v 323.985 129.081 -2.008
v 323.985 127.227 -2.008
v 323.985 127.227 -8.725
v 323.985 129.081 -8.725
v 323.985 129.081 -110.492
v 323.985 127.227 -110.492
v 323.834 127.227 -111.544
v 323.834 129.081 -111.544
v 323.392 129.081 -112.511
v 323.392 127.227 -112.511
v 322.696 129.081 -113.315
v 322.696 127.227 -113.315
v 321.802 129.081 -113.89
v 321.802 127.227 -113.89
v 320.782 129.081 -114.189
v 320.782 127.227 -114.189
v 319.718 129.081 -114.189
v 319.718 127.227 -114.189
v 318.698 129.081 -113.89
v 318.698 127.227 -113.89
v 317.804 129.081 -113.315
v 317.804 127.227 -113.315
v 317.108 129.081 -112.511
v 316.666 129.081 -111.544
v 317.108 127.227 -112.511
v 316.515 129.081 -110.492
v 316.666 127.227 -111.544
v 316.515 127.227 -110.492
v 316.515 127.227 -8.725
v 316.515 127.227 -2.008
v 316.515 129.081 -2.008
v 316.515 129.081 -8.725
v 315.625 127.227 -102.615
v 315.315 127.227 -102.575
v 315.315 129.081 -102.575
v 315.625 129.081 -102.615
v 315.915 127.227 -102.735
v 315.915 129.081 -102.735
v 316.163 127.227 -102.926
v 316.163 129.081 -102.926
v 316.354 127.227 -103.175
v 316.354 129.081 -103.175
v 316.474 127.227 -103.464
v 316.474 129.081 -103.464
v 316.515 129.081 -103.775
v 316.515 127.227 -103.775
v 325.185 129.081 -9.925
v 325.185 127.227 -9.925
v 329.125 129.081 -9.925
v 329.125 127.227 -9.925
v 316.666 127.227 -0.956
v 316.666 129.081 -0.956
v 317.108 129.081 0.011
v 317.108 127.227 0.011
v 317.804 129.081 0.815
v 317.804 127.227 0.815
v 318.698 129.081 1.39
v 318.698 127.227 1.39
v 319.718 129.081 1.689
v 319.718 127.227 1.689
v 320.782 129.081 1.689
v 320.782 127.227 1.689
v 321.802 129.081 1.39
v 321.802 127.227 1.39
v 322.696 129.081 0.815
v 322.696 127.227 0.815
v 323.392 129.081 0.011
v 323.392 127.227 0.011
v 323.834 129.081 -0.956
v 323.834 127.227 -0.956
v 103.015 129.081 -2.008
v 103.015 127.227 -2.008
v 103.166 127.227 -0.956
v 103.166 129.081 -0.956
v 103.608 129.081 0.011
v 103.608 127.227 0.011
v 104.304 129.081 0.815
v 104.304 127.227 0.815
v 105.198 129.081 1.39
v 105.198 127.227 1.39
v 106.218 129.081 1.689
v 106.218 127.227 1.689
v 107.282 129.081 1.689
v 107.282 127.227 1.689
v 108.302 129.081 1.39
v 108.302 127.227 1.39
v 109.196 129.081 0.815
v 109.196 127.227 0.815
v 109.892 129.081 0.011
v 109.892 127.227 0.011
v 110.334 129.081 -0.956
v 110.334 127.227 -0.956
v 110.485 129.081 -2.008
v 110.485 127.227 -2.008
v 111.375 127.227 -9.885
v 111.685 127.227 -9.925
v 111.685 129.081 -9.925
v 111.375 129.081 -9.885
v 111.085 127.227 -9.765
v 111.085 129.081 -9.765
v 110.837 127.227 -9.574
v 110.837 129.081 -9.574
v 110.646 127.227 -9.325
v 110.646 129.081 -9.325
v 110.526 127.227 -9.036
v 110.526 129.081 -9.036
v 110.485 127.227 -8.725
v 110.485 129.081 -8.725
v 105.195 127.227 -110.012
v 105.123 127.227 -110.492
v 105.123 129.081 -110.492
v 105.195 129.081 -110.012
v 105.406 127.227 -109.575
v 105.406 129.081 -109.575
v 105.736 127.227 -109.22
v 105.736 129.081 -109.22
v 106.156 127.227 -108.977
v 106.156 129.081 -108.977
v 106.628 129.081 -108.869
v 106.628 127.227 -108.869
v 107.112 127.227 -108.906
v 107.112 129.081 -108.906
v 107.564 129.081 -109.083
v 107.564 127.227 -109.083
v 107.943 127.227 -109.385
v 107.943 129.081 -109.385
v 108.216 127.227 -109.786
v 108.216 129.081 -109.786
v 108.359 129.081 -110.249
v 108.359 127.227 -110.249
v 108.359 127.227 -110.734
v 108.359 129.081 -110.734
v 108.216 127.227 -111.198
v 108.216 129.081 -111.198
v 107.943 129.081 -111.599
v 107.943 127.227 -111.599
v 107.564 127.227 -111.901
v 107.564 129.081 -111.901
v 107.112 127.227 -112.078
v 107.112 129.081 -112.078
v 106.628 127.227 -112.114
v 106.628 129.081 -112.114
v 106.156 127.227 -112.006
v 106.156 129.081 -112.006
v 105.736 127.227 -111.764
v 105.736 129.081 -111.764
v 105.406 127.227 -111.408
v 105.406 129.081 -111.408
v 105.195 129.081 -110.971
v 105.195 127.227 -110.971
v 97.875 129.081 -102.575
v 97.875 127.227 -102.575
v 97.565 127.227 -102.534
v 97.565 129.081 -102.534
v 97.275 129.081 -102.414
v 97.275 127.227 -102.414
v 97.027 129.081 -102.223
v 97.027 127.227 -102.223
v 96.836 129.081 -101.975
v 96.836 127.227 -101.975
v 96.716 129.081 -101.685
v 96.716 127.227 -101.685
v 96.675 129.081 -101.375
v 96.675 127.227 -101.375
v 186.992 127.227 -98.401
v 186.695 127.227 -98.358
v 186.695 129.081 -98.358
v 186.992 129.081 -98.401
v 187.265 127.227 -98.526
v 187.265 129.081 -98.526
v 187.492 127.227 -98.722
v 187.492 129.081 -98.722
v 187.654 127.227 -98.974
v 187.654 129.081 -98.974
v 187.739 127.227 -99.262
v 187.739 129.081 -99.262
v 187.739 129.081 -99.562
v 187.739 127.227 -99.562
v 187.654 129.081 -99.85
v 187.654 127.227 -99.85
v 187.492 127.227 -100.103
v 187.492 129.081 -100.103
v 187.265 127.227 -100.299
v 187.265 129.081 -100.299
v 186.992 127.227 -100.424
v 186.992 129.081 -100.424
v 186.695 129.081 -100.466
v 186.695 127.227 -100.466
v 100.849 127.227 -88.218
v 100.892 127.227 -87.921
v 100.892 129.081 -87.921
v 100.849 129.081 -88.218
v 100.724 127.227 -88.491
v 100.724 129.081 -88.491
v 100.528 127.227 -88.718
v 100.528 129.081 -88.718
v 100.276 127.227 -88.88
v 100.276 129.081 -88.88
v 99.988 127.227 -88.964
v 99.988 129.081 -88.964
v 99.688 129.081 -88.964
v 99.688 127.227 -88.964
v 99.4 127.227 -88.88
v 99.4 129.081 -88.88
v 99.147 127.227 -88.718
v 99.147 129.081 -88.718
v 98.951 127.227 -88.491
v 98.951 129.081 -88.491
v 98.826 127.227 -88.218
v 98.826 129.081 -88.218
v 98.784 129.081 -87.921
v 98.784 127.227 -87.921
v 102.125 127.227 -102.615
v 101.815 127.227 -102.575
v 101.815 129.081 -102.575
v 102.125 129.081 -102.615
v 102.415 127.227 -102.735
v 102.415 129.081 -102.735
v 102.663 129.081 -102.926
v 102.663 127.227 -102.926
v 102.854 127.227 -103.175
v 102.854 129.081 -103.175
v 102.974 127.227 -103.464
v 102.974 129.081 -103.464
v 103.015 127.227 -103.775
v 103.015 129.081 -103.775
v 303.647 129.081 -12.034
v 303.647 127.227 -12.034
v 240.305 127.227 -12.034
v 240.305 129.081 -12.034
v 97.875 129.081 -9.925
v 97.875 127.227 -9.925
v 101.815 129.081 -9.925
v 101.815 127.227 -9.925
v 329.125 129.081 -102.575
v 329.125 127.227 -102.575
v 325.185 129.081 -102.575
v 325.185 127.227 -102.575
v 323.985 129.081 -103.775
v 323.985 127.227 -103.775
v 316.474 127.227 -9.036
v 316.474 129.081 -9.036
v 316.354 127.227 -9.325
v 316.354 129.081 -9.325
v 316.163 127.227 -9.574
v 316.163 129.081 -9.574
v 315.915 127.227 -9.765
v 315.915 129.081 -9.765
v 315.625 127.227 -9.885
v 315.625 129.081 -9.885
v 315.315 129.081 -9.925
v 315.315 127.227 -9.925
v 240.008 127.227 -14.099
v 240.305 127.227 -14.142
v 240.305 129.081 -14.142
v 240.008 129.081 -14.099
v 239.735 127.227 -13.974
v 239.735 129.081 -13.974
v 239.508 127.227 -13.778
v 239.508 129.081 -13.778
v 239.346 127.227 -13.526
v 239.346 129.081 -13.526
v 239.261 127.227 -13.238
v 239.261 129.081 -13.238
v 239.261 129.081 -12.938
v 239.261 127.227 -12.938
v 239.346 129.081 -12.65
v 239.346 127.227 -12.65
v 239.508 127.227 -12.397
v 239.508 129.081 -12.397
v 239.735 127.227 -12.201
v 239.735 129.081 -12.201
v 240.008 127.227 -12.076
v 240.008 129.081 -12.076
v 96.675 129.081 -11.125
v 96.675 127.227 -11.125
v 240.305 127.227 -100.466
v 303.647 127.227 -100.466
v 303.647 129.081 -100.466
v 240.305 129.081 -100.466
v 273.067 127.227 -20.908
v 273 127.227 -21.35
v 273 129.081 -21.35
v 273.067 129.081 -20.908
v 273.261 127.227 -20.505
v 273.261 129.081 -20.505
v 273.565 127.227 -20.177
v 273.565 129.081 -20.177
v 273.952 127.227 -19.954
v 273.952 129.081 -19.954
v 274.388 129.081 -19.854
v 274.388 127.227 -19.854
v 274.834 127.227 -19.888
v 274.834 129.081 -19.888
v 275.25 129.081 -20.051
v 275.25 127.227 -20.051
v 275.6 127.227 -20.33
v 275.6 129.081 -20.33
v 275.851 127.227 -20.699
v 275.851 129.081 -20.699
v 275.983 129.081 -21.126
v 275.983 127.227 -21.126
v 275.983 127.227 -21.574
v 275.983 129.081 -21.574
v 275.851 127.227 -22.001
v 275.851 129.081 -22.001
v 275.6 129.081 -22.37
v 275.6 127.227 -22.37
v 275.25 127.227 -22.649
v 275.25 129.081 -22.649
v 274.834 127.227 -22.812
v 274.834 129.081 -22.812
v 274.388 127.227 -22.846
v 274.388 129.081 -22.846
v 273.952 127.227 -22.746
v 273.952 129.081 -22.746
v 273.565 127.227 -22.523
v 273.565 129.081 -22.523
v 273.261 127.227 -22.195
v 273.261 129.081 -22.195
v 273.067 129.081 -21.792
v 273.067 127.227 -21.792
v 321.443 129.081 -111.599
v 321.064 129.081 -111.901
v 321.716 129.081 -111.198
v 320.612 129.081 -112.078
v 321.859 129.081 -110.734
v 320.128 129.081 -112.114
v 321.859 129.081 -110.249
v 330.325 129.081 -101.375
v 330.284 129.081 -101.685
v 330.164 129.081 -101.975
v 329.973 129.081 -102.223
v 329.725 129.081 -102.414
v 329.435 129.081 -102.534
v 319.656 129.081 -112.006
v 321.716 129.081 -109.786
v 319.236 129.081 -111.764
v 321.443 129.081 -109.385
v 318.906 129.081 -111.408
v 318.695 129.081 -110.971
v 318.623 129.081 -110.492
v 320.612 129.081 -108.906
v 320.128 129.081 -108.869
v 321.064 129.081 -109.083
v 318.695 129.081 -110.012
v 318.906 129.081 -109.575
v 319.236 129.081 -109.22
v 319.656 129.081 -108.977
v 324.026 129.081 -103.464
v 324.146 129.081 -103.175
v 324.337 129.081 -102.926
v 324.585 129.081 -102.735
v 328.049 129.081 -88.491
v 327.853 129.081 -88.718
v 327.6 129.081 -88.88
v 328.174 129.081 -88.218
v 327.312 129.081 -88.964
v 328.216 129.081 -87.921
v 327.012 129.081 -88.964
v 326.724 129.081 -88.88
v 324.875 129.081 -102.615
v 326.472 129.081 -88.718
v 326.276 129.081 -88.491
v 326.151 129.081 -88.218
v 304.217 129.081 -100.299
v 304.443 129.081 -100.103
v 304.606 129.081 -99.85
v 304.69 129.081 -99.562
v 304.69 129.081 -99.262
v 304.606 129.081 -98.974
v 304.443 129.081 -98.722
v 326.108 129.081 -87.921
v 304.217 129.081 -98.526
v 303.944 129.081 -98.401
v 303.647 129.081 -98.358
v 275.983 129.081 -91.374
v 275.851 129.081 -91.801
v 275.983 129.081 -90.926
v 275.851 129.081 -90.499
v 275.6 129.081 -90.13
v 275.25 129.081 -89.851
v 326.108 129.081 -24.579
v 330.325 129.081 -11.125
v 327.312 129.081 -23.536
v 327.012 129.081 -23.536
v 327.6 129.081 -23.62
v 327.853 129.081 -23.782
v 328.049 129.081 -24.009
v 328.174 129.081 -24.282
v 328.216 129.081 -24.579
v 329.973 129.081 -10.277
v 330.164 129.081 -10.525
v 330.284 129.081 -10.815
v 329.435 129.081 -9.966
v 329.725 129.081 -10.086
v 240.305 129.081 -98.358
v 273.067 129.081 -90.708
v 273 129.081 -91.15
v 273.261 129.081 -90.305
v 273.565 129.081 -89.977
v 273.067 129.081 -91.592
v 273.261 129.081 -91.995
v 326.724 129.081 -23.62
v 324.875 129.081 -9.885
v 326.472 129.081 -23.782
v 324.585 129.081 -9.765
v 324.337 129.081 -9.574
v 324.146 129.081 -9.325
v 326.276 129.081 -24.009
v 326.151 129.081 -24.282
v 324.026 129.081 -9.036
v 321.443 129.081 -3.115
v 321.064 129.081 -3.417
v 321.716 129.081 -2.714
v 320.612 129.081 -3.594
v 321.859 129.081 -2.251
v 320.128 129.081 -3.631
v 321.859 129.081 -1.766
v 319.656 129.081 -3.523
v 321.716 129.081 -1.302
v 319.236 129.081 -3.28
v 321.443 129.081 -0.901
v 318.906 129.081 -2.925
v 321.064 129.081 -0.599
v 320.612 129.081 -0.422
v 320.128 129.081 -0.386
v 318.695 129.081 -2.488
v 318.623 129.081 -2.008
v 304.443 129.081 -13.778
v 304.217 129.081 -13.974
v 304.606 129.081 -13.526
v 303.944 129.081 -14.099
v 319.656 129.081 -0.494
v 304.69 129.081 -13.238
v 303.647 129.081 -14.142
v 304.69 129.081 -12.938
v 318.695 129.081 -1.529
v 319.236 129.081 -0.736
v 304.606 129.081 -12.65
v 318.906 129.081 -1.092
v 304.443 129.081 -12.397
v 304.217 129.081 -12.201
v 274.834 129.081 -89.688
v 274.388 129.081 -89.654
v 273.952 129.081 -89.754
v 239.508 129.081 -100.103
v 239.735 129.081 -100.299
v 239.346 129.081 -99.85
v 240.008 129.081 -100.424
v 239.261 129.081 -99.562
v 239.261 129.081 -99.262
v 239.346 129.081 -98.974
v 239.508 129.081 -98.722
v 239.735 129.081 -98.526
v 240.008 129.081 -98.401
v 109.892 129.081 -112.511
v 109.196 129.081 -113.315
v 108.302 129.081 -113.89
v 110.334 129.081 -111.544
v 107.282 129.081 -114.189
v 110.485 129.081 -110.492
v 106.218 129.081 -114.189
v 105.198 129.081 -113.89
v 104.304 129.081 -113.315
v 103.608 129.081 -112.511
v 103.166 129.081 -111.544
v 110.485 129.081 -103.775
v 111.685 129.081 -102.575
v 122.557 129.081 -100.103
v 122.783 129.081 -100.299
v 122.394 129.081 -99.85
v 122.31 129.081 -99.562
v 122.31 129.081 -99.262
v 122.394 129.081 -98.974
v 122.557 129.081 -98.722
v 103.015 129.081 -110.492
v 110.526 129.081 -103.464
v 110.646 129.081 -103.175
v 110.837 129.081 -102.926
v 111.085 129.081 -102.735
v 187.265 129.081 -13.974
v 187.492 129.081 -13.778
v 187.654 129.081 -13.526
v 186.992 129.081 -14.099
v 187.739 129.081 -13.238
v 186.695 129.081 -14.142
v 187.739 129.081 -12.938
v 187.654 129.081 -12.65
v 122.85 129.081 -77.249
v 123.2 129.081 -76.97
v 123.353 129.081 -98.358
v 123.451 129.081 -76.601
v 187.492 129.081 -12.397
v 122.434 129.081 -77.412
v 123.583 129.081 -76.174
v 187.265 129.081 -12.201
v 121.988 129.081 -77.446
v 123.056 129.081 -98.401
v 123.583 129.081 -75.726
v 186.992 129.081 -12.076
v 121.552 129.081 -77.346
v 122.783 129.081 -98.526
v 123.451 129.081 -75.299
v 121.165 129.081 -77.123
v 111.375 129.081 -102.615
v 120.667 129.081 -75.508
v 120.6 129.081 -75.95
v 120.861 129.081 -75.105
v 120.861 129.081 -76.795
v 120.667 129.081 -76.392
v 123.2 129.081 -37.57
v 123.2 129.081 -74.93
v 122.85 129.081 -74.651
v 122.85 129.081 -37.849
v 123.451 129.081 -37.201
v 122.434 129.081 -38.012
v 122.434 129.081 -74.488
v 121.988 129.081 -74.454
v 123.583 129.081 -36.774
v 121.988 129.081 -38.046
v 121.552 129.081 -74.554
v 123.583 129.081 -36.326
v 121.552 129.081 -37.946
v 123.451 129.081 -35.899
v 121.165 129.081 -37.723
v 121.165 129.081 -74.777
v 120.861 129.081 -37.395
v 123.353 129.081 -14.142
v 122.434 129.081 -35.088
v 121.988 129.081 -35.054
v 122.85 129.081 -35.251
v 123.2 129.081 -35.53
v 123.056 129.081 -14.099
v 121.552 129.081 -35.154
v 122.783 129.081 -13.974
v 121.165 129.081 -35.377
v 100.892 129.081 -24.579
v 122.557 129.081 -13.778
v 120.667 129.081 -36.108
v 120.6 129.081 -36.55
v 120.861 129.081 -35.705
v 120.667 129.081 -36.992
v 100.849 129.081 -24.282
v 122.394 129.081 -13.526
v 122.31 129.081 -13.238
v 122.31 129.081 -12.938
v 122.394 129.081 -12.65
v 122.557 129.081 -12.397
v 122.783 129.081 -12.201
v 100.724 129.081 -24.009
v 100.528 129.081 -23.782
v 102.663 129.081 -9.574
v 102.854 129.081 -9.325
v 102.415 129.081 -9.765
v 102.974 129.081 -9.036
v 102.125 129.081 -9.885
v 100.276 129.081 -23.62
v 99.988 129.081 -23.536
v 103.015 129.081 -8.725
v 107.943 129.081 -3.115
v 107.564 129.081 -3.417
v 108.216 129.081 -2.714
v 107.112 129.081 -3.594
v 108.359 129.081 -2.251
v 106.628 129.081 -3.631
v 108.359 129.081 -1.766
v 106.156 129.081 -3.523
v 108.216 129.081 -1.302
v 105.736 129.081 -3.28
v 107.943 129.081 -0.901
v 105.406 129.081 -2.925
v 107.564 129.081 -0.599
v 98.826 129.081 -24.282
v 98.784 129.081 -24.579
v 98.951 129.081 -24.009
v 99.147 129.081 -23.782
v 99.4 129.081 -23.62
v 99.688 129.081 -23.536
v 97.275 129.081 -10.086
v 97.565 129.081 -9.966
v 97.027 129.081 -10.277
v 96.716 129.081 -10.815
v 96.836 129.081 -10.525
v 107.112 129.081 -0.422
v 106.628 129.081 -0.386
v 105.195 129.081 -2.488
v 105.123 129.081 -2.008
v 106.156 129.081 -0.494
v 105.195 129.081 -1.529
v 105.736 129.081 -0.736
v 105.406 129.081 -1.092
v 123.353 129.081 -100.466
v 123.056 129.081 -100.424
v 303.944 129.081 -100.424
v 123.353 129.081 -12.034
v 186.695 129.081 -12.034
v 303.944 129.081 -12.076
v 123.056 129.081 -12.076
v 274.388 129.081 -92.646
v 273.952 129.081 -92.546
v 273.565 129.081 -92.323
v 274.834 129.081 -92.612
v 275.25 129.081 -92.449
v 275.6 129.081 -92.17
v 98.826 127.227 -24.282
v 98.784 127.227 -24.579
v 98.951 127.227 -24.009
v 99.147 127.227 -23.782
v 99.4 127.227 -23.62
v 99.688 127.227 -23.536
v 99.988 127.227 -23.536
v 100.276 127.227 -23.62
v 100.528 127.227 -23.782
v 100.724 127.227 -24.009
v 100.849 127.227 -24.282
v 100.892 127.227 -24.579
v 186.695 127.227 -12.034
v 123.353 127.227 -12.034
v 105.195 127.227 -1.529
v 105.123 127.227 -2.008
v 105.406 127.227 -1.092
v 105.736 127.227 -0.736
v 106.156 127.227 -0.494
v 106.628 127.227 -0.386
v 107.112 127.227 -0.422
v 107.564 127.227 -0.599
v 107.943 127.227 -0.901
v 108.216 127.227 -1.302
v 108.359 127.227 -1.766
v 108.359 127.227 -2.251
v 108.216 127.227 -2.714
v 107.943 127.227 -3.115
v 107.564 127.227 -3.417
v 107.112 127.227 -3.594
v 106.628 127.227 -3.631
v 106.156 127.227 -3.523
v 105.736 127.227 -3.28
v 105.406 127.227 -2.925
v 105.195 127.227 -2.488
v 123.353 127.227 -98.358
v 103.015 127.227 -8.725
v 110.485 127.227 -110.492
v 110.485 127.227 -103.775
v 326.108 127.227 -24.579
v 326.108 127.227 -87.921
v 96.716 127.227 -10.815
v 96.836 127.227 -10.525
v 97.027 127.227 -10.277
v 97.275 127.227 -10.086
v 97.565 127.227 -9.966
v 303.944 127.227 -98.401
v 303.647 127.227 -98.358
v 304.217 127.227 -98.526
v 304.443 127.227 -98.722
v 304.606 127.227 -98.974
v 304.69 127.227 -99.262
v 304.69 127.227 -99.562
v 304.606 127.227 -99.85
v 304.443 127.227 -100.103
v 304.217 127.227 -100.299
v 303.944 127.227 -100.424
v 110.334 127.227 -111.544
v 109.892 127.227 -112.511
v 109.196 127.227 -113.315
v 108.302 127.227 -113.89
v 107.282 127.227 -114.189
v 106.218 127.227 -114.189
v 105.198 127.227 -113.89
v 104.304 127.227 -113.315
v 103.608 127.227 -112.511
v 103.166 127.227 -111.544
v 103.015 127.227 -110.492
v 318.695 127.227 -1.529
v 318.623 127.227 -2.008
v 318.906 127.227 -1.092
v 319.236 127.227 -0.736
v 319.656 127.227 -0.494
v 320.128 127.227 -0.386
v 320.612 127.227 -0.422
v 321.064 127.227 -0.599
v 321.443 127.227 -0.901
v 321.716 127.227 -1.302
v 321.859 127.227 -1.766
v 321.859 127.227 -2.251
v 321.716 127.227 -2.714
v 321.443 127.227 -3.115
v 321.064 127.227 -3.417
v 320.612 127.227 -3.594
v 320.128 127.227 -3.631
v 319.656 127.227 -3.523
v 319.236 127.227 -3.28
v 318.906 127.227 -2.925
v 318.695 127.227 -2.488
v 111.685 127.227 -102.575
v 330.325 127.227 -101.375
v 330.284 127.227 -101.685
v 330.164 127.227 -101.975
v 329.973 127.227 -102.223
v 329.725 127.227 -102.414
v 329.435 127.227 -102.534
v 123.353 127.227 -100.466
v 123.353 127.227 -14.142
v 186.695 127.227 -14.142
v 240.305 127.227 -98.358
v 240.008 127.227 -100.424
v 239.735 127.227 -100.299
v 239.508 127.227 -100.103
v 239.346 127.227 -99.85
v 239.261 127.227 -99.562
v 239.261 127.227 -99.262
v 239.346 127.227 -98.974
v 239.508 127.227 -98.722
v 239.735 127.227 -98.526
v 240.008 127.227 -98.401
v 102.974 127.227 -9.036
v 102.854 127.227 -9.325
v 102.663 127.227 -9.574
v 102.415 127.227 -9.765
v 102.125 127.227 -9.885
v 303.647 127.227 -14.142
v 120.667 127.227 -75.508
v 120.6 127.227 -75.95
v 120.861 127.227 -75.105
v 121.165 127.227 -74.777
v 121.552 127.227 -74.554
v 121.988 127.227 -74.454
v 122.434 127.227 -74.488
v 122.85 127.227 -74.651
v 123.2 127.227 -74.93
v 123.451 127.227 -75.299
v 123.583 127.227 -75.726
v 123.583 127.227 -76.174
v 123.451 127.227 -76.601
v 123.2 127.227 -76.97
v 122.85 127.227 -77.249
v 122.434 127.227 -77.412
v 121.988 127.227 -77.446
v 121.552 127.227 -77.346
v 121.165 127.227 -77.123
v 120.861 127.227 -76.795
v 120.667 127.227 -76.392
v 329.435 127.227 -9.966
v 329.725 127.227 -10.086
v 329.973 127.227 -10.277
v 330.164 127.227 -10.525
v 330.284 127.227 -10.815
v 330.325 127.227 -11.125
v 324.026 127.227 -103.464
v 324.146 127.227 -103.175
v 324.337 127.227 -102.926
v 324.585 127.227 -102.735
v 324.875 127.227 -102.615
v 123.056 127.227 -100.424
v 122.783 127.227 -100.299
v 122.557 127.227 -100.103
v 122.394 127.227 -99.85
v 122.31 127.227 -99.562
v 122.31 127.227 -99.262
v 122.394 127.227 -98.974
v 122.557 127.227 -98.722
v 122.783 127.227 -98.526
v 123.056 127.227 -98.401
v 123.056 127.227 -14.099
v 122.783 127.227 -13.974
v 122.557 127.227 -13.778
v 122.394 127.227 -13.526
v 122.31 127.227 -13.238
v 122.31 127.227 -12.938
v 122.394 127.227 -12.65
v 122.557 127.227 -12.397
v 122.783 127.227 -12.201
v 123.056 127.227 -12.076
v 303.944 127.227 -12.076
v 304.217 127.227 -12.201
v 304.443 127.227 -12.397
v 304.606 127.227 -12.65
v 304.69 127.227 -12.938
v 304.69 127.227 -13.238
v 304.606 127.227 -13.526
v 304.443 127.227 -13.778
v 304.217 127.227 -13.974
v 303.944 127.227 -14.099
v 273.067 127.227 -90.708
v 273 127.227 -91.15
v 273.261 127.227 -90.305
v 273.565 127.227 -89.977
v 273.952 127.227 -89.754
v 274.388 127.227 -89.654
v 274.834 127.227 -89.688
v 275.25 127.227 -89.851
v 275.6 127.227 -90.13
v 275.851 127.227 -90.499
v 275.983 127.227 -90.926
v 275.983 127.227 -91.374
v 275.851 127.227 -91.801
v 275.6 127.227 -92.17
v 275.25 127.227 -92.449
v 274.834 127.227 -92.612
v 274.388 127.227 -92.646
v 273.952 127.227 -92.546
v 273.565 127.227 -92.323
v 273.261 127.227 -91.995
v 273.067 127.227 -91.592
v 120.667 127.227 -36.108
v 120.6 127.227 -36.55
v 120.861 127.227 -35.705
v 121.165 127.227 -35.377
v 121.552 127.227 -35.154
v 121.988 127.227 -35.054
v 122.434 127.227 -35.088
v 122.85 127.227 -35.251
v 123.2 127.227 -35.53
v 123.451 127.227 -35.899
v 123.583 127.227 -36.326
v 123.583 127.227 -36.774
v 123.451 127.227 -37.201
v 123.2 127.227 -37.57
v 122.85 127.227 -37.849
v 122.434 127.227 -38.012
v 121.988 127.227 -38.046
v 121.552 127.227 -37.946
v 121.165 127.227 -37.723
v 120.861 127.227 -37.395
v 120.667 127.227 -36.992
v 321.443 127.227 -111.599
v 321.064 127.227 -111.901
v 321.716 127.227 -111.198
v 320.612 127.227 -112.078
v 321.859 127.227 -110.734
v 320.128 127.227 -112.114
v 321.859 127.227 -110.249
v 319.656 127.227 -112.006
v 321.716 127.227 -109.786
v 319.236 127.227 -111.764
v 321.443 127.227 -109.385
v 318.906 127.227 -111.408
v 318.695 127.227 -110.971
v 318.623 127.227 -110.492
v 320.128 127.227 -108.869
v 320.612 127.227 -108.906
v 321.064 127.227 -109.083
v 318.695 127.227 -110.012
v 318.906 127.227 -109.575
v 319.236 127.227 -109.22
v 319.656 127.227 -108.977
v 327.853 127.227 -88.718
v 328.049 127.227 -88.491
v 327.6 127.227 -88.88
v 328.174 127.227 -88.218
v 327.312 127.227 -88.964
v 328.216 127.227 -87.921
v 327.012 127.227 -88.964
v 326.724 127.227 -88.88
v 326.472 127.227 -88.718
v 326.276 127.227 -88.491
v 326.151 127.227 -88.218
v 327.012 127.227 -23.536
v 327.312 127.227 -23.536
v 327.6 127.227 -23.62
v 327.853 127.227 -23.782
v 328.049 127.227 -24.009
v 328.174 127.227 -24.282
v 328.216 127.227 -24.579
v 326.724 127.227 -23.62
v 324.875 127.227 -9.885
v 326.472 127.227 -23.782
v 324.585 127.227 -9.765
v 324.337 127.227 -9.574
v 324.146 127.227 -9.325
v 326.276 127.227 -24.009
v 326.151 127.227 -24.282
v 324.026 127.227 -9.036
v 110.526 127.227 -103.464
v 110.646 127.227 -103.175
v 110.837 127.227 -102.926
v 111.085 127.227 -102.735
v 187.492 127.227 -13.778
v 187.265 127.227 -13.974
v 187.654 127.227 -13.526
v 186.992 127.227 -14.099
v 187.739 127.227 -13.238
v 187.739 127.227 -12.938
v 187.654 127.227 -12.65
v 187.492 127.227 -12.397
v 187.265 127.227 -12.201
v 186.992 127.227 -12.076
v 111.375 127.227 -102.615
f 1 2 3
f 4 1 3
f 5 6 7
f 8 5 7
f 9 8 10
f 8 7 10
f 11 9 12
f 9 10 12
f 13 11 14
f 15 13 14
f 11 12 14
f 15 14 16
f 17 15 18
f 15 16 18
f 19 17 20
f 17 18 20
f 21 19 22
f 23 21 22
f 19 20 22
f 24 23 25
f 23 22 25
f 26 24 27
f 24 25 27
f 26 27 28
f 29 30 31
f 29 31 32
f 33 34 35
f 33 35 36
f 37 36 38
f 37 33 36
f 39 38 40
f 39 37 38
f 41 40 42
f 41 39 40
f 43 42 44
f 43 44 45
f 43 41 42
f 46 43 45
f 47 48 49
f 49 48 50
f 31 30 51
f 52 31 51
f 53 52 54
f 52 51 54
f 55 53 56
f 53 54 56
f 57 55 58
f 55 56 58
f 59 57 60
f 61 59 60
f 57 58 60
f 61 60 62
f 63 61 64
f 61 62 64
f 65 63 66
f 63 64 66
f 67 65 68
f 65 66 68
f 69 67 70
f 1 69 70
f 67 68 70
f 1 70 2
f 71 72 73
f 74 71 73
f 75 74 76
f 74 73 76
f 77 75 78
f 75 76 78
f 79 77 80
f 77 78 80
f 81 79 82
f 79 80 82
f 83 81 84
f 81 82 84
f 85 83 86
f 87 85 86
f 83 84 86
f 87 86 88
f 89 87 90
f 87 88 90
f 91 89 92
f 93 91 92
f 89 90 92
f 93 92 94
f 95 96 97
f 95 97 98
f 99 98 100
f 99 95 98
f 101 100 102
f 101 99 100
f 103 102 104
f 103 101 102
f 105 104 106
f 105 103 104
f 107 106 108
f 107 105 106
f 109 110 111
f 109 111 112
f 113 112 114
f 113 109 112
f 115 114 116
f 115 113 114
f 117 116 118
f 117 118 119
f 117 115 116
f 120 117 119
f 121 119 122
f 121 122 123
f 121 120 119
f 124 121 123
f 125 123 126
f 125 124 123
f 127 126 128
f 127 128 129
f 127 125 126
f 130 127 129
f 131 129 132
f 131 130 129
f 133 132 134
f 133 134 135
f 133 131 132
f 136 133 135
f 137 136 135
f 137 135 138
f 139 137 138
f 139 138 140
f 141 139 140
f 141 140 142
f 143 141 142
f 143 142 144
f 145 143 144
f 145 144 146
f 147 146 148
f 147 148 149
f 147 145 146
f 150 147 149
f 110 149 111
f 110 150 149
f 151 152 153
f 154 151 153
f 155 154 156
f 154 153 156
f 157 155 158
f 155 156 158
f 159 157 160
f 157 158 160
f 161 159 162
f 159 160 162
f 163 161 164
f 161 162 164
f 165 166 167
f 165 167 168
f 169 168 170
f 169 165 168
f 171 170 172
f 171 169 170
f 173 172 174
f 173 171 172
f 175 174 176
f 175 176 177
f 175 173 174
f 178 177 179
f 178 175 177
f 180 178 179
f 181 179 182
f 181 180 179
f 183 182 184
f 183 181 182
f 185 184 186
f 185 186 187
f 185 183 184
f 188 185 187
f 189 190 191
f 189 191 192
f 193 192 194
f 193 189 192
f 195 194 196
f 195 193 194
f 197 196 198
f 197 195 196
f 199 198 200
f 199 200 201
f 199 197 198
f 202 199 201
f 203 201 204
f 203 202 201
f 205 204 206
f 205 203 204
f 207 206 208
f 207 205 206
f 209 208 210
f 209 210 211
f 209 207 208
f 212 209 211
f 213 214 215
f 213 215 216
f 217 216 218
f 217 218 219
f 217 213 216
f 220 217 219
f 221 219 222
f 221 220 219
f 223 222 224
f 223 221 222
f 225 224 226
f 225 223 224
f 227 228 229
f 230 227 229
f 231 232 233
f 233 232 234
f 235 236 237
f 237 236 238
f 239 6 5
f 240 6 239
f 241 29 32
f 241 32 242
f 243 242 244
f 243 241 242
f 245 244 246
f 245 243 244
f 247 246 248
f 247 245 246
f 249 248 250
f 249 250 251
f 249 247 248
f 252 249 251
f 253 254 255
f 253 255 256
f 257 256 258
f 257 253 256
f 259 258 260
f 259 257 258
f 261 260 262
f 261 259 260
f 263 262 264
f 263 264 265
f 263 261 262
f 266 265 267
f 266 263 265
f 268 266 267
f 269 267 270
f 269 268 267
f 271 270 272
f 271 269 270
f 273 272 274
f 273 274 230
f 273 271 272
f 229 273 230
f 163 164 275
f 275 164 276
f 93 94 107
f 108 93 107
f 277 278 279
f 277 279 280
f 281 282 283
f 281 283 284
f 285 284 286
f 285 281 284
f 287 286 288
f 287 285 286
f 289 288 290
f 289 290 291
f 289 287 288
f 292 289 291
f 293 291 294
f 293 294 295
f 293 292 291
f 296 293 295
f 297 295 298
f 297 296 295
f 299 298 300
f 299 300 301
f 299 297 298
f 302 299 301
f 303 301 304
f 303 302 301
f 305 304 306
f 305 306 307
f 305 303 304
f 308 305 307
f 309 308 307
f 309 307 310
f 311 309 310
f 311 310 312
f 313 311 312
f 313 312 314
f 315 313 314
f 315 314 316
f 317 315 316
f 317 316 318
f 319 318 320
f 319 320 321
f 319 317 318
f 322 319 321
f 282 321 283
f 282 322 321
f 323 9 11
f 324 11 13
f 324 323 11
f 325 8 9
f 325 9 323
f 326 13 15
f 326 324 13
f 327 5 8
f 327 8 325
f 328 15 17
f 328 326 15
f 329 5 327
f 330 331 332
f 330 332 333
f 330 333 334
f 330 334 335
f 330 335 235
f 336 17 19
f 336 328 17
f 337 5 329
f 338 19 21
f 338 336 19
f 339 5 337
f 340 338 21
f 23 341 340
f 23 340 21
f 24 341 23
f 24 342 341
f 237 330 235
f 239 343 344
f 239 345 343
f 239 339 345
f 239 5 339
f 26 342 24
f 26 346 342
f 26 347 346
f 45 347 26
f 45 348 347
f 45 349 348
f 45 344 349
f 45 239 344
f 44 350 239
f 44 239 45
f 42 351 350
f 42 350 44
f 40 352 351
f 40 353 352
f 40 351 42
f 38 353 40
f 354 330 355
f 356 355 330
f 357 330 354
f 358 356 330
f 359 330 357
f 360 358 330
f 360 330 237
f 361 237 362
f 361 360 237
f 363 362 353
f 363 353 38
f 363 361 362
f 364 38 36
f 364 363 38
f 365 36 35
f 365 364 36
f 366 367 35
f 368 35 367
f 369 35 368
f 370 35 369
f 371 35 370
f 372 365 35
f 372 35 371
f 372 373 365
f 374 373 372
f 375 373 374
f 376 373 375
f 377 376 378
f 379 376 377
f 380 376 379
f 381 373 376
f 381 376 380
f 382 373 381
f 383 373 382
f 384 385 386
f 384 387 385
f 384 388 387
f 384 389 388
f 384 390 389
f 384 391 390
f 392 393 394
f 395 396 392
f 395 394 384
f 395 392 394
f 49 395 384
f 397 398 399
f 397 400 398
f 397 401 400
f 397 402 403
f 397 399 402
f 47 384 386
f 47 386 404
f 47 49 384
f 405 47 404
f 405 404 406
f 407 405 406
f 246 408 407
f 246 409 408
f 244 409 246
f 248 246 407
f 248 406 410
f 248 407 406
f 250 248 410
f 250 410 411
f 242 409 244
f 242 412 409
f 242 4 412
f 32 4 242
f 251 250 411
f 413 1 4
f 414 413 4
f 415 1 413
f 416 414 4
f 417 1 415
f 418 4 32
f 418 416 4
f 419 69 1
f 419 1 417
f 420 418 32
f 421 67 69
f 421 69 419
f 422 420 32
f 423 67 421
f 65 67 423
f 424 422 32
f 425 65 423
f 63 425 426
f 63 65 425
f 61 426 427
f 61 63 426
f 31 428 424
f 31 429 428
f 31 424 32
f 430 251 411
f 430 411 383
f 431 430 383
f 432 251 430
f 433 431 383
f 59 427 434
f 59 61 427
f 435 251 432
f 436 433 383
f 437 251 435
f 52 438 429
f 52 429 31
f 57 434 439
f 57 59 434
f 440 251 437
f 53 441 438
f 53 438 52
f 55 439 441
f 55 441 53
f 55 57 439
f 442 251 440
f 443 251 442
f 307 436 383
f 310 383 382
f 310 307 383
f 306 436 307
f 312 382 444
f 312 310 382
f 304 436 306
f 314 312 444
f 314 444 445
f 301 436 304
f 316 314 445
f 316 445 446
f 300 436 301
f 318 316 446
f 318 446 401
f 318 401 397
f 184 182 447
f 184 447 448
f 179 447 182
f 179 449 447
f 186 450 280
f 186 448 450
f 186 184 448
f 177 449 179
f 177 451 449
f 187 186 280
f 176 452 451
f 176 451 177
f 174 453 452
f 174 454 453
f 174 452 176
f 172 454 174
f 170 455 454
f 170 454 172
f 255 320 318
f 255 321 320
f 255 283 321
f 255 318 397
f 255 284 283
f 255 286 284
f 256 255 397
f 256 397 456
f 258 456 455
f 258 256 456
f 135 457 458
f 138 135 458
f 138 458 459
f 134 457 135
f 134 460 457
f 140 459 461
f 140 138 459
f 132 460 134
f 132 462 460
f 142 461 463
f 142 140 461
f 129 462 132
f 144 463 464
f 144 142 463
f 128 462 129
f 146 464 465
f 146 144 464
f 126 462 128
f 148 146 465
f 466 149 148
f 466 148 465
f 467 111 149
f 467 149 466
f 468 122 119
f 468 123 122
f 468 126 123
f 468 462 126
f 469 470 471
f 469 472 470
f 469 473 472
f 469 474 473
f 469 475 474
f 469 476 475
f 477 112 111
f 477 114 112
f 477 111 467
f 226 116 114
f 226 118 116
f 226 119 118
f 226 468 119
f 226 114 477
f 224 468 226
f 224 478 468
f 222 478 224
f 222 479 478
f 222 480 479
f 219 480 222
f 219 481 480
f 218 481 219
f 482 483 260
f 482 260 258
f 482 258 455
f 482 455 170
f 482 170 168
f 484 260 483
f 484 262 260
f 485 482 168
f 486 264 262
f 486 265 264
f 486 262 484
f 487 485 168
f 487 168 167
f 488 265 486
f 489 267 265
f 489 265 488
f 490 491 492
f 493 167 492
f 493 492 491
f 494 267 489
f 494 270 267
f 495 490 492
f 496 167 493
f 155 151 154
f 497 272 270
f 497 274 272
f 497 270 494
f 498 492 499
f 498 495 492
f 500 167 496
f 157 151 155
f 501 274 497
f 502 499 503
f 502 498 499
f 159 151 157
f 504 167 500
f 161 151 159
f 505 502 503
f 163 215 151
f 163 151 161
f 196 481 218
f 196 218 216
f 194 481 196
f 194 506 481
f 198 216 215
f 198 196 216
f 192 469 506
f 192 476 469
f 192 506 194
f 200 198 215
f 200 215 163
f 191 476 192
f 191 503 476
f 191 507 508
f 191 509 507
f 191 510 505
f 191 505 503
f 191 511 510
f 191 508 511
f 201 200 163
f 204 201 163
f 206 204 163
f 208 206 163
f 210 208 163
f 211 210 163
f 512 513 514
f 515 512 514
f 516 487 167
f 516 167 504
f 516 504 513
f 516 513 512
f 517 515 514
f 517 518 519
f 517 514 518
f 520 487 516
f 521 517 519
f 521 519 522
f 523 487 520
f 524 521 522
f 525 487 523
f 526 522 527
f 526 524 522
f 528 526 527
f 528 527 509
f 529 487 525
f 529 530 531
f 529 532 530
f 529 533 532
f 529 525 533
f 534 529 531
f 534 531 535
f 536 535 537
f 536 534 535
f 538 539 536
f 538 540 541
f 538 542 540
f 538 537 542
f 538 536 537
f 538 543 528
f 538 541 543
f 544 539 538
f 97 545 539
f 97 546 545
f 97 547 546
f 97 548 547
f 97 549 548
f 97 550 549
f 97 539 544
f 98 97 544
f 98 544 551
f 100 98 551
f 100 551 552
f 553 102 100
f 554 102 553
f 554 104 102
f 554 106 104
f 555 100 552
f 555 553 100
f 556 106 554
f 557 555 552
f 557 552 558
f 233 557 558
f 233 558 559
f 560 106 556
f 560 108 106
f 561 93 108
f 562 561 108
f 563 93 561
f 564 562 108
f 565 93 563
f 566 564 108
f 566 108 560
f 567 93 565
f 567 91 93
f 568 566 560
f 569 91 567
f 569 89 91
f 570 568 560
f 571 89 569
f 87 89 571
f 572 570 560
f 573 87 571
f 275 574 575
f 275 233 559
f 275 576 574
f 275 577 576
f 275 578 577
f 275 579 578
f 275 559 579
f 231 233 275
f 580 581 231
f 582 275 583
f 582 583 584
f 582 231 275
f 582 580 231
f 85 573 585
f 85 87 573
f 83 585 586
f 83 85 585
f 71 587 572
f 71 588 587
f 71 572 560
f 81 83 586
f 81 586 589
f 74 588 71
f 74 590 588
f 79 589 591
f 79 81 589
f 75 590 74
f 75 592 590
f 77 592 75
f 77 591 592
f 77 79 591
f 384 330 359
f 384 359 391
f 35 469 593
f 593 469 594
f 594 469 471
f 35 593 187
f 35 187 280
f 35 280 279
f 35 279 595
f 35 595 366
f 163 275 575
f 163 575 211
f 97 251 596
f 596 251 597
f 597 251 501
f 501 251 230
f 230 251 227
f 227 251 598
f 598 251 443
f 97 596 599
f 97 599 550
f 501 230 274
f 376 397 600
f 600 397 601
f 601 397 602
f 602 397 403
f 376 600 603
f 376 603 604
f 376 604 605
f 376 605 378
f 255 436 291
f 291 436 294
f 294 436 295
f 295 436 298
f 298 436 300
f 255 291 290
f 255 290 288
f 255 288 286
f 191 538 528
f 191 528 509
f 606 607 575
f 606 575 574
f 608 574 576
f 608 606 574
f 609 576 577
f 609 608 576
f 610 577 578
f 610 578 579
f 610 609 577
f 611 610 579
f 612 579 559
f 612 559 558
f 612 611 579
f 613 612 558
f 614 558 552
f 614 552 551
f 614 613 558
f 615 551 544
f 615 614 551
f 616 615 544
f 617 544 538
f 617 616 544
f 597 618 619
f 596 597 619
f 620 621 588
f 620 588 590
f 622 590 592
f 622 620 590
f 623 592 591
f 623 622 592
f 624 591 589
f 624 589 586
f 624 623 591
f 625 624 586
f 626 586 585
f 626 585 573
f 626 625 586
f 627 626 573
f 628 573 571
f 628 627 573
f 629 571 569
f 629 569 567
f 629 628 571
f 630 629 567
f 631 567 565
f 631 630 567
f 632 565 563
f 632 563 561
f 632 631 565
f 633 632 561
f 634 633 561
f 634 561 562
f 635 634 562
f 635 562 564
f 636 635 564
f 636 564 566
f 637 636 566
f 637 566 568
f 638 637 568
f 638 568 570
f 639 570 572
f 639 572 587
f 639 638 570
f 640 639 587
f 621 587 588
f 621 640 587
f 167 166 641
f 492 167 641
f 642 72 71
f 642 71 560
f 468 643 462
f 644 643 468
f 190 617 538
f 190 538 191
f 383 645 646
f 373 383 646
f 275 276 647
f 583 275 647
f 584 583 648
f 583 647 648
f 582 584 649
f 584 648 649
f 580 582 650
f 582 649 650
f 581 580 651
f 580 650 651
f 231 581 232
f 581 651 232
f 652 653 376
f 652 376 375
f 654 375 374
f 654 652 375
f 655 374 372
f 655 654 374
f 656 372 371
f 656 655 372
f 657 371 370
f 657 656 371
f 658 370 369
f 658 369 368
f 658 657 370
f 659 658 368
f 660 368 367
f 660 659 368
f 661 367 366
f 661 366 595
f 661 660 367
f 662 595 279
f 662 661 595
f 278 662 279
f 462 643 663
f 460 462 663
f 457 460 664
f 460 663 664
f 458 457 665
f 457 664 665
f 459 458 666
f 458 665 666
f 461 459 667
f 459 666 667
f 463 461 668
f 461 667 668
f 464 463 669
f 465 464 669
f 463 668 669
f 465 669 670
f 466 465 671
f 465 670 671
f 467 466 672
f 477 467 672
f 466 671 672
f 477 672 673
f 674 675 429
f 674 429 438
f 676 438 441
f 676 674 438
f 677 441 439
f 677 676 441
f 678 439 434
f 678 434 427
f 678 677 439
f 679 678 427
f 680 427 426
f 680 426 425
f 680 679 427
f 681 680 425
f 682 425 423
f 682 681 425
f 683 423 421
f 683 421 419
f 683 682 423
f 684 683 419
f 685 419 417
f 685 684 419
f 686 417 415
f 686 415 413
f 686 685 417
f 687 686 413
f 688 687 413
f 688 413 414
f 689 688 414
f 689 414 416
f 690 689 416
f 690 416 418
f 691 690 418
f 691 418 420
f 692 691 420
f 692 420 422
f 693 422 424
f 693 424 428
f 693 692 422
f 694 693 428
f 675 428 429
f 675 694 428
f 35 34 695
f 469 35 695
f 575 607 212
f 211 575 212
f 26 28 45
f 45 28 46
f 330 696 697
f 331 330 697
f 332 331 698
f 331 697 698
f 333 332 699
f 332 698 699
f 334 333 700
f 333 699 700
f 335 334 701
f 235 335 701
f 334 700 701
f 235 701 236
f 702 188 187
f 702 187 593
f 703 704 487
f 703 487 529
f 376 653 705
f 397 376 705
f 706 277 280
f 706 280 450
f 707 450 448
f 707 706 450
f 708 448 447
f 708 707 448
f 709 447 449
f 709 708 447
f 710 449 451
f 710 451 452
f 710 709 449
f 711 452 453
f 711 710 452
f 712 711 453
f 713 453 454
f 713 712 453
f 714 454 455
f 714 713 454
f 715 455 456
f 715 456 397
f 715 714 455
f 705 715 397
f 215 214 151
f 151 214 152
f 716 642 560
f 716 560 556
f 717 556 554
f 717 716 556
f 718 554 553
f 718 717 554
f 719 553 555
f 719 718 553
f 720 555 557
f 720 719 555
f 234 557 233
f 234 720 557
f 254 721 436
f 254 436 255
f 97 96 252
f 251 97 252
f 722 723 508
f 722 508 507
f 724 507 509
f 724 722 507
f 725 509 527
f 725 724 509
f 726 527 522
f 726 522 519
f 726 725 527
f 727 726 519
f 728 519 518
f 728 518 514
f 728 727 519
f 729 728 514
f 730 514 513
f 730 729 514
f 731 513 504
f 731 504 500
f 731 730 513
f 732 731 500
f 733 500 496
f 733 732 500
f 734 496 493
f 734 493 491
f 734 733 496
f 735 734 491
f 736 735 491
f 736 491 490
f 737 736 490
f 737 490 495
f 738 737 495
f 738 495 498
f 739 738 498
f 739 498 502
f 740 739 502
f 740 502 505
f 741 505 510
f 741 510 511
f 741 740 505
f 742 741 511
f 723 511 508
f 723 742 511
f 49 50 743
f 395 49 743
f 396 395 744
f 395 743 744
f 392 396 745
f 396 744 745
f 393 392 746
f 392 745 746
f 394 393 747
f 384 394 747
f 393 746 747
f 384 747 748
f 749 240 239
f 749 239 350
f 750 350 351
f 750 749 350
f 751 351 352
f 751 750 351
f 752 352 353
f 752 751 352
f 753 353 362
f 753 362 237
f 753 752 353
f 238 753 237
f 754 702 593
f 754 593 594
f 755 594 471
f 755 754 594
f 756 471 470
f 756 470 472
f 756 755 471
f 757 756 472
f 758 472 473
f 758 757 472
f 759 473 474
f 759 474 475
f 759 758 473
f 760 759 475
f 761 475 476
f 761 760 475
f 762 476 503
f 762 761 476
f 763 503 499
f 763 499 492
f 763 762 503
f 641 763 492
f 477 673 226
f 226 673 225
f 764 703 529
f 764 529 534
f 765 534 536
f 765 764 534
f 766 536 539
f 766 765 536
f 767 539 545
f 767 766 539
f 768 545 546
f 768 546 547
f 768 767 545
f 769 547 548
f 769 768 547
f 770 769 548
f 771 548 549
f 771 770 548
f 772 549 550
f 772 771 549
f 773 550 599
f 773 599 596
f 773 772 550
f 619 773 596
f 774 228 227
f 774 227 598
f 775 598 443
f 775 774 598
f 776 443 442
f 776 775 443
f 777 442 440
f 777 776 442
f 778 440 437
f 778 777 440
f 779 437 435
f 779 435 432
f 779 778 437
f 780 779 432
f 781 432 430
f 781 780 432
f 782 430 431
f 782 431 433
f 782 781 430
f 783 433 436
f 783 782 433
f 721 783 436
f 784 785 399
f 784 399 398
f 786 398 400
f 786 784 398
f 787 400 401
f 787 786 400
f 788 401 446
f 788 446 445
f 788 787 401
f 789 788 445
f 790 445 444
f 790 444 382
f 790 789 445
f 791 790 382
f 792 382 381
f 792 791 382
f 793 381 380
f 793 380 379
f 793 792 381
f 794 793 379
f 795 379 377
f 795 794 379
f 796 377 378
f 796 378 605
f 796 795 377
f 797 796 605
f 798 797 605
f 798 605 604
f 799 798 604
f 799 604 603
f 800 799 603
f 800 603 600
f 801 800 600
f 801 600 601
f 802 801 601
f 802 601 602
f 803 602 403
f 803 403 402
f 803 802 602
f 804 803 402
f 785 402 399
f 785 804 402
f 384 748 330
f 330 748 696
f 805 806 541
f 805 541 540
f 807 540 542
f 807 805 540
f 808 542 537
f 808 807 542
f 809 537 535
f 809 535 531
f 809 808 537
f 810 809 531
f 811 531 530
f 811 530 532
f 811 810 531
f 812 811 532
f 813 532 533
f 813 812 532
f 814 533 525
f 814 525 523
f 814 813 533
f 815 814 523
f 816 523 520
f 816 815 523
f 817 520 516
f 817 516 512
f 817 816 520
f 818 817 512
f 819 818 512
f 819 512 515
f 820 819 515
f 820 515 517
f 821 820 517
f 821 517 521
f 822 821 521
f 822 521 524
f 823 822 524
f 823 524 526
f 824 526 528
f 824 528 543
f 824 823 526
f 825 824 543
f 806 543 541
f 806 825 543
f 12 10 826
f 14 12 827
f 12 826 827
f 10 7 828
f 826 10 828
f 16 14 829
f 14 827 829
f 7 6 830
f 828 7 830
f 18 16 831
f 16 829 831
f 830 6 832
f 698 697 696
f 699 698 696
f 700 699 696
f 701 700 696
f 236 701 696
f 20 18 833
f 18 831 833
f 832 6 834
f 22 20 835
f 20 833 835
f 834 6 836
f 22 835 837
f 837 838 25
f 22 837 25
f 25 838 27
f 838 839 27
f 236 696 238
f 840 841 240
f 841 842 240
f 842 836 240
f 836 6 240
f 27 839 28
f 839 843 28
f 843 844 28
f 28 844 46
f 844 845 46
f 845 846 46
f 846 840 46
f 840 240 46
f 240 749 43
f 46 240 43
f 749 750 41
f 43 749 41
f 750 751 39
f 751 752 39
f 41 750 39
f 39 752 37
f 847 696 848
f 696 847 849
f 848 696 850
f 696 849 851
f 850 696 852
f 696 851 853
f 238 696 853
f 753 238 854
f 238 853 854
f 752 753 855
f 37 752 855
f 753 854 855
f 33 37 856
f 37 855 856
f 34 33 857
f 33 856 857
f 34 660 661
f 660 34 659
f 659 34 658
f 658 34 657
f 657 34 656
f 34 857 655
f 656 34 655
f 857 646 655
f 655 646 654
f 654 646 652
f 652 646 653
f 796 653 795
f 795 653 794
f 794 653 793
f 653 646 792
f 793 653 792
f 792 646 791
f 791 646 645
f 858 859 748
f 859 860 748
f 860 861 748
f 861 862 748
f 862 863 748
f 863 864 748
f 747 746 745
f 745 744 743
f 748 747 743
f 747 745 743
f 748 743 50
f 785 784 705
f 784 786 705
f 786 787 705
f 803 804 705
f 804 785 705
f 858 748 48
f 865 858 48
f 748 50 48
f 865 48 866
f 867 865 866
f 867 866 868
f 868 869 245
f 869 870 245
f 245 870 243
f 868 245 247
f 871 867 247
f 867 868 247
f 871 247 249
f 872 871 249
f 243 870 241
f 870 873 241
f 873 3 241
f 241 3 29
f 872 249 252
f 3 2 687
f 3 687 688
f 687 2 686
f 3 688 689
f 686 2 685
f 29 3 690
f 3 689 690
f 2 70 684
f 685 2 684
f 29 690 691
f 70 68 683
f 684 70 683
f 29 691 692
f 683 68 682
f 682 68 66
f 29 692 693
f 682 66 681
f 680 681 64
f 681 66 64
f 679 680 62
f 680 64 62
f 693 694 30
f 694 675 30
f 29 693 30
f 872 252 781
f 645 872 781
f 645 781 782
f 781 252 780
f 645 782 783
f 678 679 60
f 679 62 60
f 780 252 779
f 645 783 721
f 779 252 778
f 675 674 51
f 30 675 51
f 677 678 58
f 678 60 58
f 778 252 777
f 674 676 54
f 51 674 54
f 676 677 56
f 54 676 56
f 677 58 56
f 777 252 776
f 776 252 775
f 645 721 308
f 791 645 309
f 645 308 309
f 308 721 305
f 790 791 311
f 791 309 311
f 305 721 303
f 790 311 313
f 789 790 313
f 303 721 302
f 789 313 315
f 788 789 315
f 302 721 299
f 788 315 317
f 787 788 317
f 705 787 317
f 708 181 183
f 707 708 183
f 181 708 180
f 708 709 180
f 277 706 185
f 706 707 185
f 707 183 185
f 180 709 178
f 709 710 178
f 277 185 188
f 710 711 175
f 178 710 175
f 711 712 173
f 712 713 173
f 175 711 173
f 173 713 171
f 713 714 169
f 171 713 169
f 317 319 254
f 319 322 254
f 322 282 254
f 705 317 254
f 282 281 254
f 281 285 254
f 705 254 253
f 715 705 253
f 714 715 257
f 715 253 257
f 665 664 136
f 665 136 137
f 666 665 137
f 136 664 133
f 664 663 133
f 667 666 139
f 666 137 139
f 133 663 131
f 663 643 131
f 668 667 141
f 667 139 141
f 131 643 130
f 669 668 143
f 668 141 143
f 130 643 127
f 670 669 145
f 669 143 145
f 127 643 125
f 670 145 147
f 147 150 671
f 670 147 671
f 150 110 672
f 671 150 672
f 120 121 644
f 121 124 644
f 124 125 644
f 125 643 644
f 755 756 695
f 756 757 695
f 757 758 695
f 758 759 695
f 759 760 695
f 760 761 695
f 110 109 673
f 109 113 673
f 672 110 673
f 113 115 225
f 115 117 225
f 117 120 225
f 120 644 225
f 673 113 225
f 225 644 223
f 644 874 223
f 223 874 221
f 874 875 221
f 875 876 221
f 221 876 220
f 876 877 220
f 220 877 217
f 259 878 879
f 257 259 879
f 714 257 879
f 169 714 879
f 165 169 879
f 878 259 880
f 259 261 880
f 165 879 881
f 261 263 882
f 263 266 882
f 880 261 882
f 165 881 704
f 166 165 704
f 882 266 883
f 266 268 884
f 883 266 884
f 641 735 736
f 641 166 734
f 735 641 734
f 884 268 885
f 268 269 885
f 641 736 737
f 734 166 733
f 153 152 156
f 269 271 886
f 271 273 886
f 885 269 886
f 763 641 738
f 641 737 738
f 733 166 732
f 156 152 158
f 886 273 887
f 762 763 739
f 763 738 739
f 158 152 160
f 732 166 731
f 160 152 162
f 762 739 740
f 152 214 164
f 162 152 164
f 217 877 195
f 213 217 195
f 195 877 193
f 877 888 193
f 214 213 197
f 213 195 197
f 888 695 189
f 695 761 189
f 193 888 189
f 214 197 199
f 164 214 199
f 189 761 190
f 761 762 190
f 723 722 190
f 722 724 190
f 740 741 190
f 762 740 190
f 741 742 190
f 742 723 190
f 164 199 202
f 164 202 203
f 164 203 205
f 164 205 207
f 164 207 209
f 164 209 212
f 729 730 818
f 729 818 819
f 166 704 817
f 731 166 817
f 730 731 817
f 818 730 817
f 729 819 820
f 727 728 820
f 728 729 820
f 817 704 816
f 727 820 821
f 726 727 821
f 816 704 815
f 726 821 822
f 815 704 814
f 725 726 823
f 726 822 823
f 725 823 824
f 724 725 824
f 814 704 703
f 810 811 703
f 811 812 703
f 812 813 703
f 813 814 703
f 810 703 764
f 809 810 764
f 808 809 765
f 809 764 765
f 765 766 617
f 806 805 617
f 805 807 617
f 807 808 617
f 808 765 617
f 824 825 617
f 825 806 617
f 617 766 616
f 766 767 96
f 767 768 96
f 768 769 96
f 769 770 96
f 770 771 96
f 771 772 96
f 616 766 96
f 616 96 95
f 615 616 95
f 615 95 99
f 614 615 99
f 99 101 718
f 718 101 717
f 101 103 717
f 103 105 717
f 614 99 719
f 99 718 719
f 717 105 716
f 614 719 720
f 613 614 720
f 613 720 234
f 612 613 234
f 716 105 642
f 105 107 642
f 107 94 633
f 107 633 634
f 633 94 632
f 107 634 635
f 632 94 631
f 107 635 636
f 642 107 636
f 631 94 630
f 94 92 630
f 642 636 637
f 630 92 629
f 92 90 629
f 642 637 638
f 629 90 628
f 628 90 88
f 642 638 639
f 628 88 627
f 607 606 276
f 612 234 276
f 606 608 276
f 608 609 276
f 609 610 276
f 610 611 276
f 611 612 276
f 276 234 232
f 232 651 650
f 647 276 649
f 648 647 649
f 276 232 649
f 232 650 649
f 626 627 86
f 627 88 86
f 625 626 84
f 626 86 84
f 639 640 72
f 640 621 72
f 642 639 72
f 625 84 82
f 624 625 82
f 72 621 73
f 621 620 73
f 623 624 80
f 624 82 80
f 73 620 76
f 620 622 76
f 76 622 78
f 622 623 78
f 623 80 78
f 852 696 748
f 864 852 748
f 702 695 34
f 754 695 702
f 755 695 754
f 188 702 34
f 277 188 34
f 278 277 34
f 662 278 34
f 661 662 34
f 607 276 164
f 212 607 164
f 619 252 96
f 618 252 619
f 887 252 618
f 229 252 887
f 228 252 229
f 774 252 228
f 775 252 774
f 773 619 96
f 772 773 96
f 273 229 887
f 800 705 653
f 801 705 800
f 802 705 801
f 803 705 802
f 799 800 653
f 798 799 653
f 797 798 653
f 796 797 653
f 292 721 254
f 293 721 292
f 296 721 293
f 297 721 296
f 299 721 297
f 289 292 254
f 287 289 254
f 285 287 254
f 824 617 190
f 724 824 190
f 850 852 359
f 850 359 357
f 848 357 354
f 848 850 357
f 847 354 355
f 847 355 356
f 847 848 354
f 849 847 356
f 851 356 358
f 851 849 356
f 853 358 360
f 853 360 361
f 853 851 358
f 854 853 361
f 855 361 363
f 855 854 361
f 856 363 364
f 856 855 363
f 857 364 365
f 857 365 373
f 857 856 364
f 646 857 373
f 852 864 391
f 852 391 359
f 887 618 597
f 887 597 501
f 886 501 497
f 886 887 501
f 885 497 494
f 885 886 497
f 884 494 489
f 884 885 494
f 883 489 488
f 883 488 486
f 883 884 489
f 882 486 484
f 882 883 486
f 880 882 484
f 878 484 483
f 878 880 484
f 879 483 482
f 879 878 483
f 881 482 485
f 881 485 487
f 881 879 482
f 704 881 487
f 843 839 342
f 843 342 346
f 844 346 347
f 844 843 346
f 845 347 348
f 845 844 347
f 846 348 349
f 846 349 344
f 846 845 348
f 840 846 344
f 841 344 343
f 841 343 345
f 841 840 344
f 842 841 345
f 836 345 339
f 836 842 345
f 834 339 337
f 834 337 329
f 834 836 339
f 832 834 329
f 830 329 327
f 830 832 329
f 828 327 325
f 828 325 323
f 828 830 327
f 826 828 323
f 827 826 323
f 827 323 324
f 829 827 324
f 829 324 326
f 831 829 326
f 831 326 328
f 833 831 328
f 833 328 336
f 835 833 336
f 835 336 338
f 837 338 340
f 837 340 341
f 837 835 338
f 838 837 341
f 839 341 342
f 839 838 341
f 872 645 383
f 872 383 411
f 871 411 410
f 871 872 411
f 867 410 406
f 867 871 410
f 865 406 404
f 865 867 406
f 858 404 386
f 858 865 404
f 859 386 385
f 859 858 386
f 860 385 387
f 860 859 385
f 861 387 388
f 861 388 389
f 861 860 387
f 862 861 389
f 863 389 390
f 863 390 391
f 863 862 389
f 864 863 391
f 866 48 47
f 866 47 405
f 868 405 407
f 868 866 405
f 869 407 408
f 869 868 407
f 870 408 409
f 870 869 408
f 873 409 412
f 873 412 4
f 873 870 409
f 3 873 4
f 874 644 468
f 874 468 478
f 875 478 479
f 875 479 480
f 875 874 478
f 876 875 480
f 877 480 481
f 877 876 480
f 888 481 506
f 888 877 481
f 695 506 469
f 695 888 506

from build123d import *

# Parameters (mm, degrees)
SKETCH_R   = 1.627
SKETCH_R_2 = 1.5
PAD_DEPTH  = 1.8542


with BuildPart() as part:
    # Sketch (on Face85 of Binder) → Pad (new body)
    with BuildSketch(Plane(origin=(0, 127.2271, 0), x_dir=(-1, 0, 0), z_dir=(0, 1, 0))):
        with BuildLine():
            Line((-330.3246, -11.1254), (-330.3246, -101.3746))
            ThreePointArc((-330.3246, -101.3746), (-329.973128, -102.223128), (-329.1246, -102.5746))
            Line((-329.1246, -102.5746), (-325.1852, -102.5746))
            ThreePointArc((-323.9852, -103.7746), (-324.336672, -102.926072), (-325.1852, -102.5746))
            Line((-323.9852, -110.4919), (-323.9852, -103.7746))
            ThreePointArc((-323.9852, -110.4919), (-320.25, -114.2271), (-316.5148, -110.4919))
            Line((-316.5148, -110.4919), (-316.5148, -103.7746))
            ThreePointArc((-315.3148, -102.5746), (-316.163328, -102.926072), (-316.5148, -103.7746))
            Line((-315.3148, -102.5746), (-111.6852, -102.5746))
            ThreePointArc((-110.4852, -103.7746), (-110.836672, -102.926072), (-111.6852, -102.5746))
            Line((-110.4852, -110.4919), (-110.4852, -103.7746))
            ThreePointArc((-110.4852, -110.4919), (-106.75, -114.2271), (-103.0148, -110.4919))
            Line((-103.0148, -110.4919), (-103.0148, -103.7746))
            ThreePointArc((-101.8148, -102.5746), (-102.663328, -102.926072), (-103.0148, -103.7746))
            Line((-101.8148, -102.5746), (-97.8754, -102.5746))
            ThreePointArc((-97.8754, -102.5746), (-97.026872, -102.223128), (-96.6754, -101.3746))
            Line((-96.6754, -101.3746), (-96.6754, -11.1254))
            ThreePointArc((-96.6754, -11.1254), (-97.026872, -10.276872), (-97.8754, -9.9254))
            Line((-97.8754, -9.9254), (-101.8148, -9.9254))
            ThreePointArc((-103.0148, -8.7254), (-102.663328, -9.573928), (-101.8148, -9.9254))
            Line((-103.0148, -2.0081), (-103.0148, -8.7254))
            ThreePointArc((-103.0148, -2.0081), (-106.75, 1.7271), (-110.4852, -2.0081))
            Line((-110.4852, -2.0081), (-110.4852, -8.7254))
            ThreePointArc((-111.6852, -9.9254), (-110.836672, -9.573928), (-110.4852, -8.7254))
            Line((-111.6852, -9.9254), (-315.3148, -9.9254))
            ThreePointArc((-316.5148, -8.7254), (-316.163328, -9.573928), (-315.3148, -9.9254))
            Line((-316.5148, -2.0081), (-316.5148, -8.7254))
            ThreePointArc((-316.5148, -2.0081), (-320.25, 1.7271), (-323.9852, -2.0081))
            Line((-323.9852, -2.0081), (-323.9852, -8.7254))
            ThreePointArc((-325.1852, -9.9254), (-324.336672, -9.573928), (-323.9852, -8.7254))
            Line((-325.1852, -9.9254), (-329.1246, -9.9254))
            ThreePointArc((-329.1246, -9.9254), (-329.973128, -10.276872), (-330.3246, -11.1254))
        make_face()
        with Locations((-320.25, -2.0081)):
            Circle(SKETCH_R, mode=Mode.SUBTRACT)
        with Locations((-106.75, -2.0081)):
            Circle(SKETCH_R, mode=Mode.SUBTRACT)
        with Locations((-122.1, -36.55)):
            Circle(SKETCH_R_2, mode=Mode.SUBTRACT)
        with Locations((-122.1, -75.95)):
            Circle(SKETCH_R_2, mode=Mode.SUBTRACT)
        with Locations((-106.75, -110.4919)):
            Circle(SKETCH_R, mode=Mode.SUBTRACT)
        with Locations((-320.25, -110.4919)):
            Circle(SKETCH_R, mode=Mode.SUBTRACT)
        with Locations((-274.5, -91.15)):
            Circle(SKETCH_R_2, mode=Mode.SUBTRACT)
        with Locations((-274.5, -21.35)):
            Circle(SKETCH_R_2, mode=Mode.SUBTRACT)
        with BuildLine():
            ThreePointArc((-326.1082, -24.579), (-327.1623, -23.5249), (-328.2164, -24.579))
            Line((-328.2164, -24.579), (-328.2164, -87.921))
            ThreePointArc((-328.2164, -87.921), (-327.1623, -88.9751), (-326.1082, -87.921))
            Line((-326.1082, -24.579), (-326.1082, -87.921))
        make_face(mode=Mode.SUBTRACT)
        with BuildLine():
            ThreePointArc((-98.7836, -24.579), (-99.8377, -23.5249), (-100.8918, -24.579))
            Line((-100.8918, -24.579), (-100.8918, -87.921))
            ThreePointArc((-100.8918, -87.921), (-99.8377, -88.9751), (-98.7836, -87.921))
            Line((-98.7836, -24.579), (-98.7836, -87.921))
        make_face(mode=Mode.SUBTRACT)
        with BuildLine():
            ThreePointArc((-303.6468, -12.0336), (-304.7009, -13.0877), (-303.6468, -14.1418))
            Line((-303.6468, -14.1418), (-240.3048, -14.1418))
            ThreePointArc((-240.3048, -14.1418), (-239.2507, -13.0877), (-240.3048, -12.0336))
            Line((-303.6468, -12.0336), (-240.3048, -12.0336))
        make_face(mode=Mode.SUBTRACT)
        with BuildLine():
            ThreePointArc((-186.6952, -12.0336), (-187.7493, -13.0877), (-186.6952, -14.1418))
            Line((-186.6952, -14.1418), (-123.3532, -14.1418))
            ThreePointArc((-123.3532, -14.1418), (-122.2991, -13.0877), (-123.3532, -12.0336))
            Line((-186.6952, -12.0336), (-123.3532, -12.0336))
        make_face(mode=Mode.SUBTRACT)
        with BuildLine():
            ThreePointArc((-303.6468, -98.3582), (-304.7009, -99.4123), (-303.6468, -100.4664))
            Line((-303.6468, -100.4664), (-240.3048, -100.4664))
            ThreePointArc((-240.3048, -100.4664), (-239.2507, -99.4123), (-240.3048, -98.3582))
            Line((-303.6468, -98.3582), (-240.3048, -98.3582))
        make_face(mode=Mode.SUBTRACT)
        with BuildLine():
            ThreePointArc((-186.6952, -98.3582), (-187.7493, -99.4123), (-186.6952, -100.4664))
            Line((-186.6952, -100.4664), (-123.3532, -100.4664))
            ThreePointArc((-123.3532, -100.4664), (-122.2991, -99.4123), (-123.3532, -98.3582))
            Line((-186.6952, -98.3582), (-123.3532, -98.3582))
        make_face(mode=Mode.SUBTRACT)
    extrude(amount=PAD_DEPTH)


solid = part.part
